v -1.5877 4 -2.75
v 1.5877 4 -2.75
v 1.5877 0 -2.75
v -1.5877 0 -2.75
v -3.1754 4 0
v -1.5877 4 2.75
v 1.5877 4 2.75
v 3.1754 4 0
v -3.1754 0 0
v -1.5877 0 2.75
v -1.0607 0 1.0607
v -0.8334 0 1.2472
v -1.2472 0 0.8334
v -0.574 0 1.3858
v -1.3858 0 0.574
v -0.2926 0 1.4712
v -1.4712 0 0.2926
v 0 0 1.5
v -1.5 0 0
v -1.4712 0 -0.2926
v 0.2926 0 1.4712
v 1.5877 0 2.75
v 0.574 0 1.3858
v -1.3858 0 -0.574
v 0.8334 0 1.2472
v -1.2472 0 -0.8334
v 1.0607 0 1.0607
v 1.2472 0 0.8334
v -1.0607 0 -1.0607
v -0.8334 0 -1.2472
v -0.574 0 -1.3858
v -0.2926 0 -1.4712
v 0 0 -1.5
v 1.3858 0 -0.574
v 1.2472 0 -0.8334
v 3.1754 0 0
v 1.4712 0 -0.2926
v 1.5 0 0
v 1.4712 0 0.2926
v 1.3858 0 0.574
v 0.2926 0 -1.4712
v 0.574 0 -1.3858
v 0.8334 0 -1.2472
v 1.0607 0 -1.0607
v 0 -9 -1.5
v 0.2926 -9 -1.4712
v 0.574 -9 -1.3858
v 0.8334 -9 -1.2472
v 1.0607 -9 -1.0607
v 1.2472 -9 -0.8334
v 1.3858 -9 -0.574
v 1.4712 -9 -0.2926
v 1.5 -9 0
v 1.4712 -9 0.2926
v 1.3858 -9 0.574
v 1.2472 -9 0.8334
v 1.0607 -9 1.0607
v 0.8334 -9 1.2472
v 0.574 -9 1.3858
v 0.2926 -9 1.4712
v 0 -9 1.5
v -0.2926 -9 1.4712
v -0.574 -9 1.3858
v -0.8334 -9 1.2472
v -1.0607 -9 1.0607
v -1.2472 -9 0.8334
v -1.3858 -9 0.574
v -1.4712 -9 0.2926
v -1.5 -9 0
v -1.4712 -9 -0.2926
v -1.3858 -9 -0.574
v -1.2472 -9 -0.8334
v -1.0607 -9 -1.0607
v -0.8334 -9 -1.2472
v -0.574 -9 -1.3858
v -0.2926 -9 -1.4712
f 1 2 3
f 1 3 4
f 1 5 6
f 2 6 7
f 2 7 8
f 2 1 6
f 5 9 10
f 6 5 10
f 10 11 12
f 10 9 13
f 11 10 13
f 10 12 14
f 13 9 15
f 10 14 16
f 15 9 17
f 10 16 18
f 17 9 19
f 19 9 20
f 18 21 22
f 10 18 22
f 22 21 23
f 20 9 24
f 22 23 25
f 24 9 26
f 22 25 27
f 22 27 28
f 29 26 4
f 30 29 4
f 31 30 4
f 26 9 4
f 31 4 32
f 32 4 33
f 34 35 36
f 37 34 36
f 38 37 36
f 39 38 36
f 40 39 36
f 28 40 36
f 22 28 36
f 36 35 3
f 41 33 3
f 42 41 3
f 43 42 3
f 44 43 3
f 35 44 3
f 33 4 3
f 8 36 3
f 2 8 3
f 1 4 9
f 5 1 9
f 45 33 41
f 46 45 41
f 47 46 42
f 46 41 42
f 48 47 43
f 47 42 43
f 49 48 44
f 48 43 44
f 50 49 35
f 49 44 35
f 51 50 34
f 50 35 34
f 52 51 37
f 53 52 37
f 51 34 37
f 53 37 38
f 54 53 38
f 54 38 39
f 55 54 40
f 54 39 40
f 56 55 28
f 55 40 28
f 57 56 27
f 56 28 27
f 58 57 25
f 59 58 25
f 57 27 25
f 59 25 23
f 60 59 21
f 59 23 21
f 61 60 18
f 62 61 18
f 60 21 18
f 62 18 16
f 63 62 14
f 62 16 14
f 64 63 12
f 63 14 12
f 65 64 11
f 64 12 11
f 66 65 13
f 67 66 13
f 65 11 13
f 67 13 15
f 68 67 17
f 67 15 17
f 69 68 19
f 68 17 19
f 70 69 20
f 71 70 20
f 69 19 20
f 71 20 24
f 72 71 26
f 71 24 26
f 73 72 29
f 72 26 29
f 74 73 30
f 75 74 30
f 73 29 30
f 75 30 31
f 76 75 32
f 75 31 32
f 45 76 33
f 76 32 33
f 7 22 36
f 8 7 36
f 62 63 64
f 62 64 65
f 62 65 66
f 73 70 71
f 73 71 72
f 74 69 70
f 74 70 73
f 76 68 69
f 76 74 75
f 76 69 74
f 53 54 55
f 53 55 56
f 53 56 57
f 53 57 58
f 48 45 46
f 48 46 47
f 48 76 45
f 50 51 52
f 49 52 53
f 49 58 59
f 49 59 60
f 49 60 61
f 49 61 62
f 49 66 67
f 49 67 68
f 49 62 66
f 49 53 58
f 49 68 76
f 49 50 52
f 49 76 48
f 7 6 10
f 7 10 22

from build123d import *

# Parameters (mm, degrees)
BOSS_EXTRUDE1_DEPTH = 4
SKETCH2_R           = 1.5
BOSS_EXTRUDE2_DEPTH = 9


with BuildPart() as part:
    # Sketch1 → Boss-Extrude1 (new body)
    with BuildSketch(Plane(origin=(0, 0, 0), x_dir=(1, 0, 0), z_dir=(0, 1, 0))):
        Polygon((3.175426481, 0), (1.58771324, 2.75), (-1.58771324, 2.75), (-3.175426481, 0), (-1.58771324, -2.75), (1.58771324, -2.75), align=None)
    extrude(amount=BOSS_EXTRUDE1_DEPTH)

    # Sketch2 → Boss-Extrude2 (add)
    with BuildSketch(Plane.XZ):
        with Locations(Location((0, 0, 0), (0, 0, 270))):
            Circle(SKETCH2_R)
    extrude(amount=BOSS_EXTRUDE2_DEPTH)


solid = part.part
